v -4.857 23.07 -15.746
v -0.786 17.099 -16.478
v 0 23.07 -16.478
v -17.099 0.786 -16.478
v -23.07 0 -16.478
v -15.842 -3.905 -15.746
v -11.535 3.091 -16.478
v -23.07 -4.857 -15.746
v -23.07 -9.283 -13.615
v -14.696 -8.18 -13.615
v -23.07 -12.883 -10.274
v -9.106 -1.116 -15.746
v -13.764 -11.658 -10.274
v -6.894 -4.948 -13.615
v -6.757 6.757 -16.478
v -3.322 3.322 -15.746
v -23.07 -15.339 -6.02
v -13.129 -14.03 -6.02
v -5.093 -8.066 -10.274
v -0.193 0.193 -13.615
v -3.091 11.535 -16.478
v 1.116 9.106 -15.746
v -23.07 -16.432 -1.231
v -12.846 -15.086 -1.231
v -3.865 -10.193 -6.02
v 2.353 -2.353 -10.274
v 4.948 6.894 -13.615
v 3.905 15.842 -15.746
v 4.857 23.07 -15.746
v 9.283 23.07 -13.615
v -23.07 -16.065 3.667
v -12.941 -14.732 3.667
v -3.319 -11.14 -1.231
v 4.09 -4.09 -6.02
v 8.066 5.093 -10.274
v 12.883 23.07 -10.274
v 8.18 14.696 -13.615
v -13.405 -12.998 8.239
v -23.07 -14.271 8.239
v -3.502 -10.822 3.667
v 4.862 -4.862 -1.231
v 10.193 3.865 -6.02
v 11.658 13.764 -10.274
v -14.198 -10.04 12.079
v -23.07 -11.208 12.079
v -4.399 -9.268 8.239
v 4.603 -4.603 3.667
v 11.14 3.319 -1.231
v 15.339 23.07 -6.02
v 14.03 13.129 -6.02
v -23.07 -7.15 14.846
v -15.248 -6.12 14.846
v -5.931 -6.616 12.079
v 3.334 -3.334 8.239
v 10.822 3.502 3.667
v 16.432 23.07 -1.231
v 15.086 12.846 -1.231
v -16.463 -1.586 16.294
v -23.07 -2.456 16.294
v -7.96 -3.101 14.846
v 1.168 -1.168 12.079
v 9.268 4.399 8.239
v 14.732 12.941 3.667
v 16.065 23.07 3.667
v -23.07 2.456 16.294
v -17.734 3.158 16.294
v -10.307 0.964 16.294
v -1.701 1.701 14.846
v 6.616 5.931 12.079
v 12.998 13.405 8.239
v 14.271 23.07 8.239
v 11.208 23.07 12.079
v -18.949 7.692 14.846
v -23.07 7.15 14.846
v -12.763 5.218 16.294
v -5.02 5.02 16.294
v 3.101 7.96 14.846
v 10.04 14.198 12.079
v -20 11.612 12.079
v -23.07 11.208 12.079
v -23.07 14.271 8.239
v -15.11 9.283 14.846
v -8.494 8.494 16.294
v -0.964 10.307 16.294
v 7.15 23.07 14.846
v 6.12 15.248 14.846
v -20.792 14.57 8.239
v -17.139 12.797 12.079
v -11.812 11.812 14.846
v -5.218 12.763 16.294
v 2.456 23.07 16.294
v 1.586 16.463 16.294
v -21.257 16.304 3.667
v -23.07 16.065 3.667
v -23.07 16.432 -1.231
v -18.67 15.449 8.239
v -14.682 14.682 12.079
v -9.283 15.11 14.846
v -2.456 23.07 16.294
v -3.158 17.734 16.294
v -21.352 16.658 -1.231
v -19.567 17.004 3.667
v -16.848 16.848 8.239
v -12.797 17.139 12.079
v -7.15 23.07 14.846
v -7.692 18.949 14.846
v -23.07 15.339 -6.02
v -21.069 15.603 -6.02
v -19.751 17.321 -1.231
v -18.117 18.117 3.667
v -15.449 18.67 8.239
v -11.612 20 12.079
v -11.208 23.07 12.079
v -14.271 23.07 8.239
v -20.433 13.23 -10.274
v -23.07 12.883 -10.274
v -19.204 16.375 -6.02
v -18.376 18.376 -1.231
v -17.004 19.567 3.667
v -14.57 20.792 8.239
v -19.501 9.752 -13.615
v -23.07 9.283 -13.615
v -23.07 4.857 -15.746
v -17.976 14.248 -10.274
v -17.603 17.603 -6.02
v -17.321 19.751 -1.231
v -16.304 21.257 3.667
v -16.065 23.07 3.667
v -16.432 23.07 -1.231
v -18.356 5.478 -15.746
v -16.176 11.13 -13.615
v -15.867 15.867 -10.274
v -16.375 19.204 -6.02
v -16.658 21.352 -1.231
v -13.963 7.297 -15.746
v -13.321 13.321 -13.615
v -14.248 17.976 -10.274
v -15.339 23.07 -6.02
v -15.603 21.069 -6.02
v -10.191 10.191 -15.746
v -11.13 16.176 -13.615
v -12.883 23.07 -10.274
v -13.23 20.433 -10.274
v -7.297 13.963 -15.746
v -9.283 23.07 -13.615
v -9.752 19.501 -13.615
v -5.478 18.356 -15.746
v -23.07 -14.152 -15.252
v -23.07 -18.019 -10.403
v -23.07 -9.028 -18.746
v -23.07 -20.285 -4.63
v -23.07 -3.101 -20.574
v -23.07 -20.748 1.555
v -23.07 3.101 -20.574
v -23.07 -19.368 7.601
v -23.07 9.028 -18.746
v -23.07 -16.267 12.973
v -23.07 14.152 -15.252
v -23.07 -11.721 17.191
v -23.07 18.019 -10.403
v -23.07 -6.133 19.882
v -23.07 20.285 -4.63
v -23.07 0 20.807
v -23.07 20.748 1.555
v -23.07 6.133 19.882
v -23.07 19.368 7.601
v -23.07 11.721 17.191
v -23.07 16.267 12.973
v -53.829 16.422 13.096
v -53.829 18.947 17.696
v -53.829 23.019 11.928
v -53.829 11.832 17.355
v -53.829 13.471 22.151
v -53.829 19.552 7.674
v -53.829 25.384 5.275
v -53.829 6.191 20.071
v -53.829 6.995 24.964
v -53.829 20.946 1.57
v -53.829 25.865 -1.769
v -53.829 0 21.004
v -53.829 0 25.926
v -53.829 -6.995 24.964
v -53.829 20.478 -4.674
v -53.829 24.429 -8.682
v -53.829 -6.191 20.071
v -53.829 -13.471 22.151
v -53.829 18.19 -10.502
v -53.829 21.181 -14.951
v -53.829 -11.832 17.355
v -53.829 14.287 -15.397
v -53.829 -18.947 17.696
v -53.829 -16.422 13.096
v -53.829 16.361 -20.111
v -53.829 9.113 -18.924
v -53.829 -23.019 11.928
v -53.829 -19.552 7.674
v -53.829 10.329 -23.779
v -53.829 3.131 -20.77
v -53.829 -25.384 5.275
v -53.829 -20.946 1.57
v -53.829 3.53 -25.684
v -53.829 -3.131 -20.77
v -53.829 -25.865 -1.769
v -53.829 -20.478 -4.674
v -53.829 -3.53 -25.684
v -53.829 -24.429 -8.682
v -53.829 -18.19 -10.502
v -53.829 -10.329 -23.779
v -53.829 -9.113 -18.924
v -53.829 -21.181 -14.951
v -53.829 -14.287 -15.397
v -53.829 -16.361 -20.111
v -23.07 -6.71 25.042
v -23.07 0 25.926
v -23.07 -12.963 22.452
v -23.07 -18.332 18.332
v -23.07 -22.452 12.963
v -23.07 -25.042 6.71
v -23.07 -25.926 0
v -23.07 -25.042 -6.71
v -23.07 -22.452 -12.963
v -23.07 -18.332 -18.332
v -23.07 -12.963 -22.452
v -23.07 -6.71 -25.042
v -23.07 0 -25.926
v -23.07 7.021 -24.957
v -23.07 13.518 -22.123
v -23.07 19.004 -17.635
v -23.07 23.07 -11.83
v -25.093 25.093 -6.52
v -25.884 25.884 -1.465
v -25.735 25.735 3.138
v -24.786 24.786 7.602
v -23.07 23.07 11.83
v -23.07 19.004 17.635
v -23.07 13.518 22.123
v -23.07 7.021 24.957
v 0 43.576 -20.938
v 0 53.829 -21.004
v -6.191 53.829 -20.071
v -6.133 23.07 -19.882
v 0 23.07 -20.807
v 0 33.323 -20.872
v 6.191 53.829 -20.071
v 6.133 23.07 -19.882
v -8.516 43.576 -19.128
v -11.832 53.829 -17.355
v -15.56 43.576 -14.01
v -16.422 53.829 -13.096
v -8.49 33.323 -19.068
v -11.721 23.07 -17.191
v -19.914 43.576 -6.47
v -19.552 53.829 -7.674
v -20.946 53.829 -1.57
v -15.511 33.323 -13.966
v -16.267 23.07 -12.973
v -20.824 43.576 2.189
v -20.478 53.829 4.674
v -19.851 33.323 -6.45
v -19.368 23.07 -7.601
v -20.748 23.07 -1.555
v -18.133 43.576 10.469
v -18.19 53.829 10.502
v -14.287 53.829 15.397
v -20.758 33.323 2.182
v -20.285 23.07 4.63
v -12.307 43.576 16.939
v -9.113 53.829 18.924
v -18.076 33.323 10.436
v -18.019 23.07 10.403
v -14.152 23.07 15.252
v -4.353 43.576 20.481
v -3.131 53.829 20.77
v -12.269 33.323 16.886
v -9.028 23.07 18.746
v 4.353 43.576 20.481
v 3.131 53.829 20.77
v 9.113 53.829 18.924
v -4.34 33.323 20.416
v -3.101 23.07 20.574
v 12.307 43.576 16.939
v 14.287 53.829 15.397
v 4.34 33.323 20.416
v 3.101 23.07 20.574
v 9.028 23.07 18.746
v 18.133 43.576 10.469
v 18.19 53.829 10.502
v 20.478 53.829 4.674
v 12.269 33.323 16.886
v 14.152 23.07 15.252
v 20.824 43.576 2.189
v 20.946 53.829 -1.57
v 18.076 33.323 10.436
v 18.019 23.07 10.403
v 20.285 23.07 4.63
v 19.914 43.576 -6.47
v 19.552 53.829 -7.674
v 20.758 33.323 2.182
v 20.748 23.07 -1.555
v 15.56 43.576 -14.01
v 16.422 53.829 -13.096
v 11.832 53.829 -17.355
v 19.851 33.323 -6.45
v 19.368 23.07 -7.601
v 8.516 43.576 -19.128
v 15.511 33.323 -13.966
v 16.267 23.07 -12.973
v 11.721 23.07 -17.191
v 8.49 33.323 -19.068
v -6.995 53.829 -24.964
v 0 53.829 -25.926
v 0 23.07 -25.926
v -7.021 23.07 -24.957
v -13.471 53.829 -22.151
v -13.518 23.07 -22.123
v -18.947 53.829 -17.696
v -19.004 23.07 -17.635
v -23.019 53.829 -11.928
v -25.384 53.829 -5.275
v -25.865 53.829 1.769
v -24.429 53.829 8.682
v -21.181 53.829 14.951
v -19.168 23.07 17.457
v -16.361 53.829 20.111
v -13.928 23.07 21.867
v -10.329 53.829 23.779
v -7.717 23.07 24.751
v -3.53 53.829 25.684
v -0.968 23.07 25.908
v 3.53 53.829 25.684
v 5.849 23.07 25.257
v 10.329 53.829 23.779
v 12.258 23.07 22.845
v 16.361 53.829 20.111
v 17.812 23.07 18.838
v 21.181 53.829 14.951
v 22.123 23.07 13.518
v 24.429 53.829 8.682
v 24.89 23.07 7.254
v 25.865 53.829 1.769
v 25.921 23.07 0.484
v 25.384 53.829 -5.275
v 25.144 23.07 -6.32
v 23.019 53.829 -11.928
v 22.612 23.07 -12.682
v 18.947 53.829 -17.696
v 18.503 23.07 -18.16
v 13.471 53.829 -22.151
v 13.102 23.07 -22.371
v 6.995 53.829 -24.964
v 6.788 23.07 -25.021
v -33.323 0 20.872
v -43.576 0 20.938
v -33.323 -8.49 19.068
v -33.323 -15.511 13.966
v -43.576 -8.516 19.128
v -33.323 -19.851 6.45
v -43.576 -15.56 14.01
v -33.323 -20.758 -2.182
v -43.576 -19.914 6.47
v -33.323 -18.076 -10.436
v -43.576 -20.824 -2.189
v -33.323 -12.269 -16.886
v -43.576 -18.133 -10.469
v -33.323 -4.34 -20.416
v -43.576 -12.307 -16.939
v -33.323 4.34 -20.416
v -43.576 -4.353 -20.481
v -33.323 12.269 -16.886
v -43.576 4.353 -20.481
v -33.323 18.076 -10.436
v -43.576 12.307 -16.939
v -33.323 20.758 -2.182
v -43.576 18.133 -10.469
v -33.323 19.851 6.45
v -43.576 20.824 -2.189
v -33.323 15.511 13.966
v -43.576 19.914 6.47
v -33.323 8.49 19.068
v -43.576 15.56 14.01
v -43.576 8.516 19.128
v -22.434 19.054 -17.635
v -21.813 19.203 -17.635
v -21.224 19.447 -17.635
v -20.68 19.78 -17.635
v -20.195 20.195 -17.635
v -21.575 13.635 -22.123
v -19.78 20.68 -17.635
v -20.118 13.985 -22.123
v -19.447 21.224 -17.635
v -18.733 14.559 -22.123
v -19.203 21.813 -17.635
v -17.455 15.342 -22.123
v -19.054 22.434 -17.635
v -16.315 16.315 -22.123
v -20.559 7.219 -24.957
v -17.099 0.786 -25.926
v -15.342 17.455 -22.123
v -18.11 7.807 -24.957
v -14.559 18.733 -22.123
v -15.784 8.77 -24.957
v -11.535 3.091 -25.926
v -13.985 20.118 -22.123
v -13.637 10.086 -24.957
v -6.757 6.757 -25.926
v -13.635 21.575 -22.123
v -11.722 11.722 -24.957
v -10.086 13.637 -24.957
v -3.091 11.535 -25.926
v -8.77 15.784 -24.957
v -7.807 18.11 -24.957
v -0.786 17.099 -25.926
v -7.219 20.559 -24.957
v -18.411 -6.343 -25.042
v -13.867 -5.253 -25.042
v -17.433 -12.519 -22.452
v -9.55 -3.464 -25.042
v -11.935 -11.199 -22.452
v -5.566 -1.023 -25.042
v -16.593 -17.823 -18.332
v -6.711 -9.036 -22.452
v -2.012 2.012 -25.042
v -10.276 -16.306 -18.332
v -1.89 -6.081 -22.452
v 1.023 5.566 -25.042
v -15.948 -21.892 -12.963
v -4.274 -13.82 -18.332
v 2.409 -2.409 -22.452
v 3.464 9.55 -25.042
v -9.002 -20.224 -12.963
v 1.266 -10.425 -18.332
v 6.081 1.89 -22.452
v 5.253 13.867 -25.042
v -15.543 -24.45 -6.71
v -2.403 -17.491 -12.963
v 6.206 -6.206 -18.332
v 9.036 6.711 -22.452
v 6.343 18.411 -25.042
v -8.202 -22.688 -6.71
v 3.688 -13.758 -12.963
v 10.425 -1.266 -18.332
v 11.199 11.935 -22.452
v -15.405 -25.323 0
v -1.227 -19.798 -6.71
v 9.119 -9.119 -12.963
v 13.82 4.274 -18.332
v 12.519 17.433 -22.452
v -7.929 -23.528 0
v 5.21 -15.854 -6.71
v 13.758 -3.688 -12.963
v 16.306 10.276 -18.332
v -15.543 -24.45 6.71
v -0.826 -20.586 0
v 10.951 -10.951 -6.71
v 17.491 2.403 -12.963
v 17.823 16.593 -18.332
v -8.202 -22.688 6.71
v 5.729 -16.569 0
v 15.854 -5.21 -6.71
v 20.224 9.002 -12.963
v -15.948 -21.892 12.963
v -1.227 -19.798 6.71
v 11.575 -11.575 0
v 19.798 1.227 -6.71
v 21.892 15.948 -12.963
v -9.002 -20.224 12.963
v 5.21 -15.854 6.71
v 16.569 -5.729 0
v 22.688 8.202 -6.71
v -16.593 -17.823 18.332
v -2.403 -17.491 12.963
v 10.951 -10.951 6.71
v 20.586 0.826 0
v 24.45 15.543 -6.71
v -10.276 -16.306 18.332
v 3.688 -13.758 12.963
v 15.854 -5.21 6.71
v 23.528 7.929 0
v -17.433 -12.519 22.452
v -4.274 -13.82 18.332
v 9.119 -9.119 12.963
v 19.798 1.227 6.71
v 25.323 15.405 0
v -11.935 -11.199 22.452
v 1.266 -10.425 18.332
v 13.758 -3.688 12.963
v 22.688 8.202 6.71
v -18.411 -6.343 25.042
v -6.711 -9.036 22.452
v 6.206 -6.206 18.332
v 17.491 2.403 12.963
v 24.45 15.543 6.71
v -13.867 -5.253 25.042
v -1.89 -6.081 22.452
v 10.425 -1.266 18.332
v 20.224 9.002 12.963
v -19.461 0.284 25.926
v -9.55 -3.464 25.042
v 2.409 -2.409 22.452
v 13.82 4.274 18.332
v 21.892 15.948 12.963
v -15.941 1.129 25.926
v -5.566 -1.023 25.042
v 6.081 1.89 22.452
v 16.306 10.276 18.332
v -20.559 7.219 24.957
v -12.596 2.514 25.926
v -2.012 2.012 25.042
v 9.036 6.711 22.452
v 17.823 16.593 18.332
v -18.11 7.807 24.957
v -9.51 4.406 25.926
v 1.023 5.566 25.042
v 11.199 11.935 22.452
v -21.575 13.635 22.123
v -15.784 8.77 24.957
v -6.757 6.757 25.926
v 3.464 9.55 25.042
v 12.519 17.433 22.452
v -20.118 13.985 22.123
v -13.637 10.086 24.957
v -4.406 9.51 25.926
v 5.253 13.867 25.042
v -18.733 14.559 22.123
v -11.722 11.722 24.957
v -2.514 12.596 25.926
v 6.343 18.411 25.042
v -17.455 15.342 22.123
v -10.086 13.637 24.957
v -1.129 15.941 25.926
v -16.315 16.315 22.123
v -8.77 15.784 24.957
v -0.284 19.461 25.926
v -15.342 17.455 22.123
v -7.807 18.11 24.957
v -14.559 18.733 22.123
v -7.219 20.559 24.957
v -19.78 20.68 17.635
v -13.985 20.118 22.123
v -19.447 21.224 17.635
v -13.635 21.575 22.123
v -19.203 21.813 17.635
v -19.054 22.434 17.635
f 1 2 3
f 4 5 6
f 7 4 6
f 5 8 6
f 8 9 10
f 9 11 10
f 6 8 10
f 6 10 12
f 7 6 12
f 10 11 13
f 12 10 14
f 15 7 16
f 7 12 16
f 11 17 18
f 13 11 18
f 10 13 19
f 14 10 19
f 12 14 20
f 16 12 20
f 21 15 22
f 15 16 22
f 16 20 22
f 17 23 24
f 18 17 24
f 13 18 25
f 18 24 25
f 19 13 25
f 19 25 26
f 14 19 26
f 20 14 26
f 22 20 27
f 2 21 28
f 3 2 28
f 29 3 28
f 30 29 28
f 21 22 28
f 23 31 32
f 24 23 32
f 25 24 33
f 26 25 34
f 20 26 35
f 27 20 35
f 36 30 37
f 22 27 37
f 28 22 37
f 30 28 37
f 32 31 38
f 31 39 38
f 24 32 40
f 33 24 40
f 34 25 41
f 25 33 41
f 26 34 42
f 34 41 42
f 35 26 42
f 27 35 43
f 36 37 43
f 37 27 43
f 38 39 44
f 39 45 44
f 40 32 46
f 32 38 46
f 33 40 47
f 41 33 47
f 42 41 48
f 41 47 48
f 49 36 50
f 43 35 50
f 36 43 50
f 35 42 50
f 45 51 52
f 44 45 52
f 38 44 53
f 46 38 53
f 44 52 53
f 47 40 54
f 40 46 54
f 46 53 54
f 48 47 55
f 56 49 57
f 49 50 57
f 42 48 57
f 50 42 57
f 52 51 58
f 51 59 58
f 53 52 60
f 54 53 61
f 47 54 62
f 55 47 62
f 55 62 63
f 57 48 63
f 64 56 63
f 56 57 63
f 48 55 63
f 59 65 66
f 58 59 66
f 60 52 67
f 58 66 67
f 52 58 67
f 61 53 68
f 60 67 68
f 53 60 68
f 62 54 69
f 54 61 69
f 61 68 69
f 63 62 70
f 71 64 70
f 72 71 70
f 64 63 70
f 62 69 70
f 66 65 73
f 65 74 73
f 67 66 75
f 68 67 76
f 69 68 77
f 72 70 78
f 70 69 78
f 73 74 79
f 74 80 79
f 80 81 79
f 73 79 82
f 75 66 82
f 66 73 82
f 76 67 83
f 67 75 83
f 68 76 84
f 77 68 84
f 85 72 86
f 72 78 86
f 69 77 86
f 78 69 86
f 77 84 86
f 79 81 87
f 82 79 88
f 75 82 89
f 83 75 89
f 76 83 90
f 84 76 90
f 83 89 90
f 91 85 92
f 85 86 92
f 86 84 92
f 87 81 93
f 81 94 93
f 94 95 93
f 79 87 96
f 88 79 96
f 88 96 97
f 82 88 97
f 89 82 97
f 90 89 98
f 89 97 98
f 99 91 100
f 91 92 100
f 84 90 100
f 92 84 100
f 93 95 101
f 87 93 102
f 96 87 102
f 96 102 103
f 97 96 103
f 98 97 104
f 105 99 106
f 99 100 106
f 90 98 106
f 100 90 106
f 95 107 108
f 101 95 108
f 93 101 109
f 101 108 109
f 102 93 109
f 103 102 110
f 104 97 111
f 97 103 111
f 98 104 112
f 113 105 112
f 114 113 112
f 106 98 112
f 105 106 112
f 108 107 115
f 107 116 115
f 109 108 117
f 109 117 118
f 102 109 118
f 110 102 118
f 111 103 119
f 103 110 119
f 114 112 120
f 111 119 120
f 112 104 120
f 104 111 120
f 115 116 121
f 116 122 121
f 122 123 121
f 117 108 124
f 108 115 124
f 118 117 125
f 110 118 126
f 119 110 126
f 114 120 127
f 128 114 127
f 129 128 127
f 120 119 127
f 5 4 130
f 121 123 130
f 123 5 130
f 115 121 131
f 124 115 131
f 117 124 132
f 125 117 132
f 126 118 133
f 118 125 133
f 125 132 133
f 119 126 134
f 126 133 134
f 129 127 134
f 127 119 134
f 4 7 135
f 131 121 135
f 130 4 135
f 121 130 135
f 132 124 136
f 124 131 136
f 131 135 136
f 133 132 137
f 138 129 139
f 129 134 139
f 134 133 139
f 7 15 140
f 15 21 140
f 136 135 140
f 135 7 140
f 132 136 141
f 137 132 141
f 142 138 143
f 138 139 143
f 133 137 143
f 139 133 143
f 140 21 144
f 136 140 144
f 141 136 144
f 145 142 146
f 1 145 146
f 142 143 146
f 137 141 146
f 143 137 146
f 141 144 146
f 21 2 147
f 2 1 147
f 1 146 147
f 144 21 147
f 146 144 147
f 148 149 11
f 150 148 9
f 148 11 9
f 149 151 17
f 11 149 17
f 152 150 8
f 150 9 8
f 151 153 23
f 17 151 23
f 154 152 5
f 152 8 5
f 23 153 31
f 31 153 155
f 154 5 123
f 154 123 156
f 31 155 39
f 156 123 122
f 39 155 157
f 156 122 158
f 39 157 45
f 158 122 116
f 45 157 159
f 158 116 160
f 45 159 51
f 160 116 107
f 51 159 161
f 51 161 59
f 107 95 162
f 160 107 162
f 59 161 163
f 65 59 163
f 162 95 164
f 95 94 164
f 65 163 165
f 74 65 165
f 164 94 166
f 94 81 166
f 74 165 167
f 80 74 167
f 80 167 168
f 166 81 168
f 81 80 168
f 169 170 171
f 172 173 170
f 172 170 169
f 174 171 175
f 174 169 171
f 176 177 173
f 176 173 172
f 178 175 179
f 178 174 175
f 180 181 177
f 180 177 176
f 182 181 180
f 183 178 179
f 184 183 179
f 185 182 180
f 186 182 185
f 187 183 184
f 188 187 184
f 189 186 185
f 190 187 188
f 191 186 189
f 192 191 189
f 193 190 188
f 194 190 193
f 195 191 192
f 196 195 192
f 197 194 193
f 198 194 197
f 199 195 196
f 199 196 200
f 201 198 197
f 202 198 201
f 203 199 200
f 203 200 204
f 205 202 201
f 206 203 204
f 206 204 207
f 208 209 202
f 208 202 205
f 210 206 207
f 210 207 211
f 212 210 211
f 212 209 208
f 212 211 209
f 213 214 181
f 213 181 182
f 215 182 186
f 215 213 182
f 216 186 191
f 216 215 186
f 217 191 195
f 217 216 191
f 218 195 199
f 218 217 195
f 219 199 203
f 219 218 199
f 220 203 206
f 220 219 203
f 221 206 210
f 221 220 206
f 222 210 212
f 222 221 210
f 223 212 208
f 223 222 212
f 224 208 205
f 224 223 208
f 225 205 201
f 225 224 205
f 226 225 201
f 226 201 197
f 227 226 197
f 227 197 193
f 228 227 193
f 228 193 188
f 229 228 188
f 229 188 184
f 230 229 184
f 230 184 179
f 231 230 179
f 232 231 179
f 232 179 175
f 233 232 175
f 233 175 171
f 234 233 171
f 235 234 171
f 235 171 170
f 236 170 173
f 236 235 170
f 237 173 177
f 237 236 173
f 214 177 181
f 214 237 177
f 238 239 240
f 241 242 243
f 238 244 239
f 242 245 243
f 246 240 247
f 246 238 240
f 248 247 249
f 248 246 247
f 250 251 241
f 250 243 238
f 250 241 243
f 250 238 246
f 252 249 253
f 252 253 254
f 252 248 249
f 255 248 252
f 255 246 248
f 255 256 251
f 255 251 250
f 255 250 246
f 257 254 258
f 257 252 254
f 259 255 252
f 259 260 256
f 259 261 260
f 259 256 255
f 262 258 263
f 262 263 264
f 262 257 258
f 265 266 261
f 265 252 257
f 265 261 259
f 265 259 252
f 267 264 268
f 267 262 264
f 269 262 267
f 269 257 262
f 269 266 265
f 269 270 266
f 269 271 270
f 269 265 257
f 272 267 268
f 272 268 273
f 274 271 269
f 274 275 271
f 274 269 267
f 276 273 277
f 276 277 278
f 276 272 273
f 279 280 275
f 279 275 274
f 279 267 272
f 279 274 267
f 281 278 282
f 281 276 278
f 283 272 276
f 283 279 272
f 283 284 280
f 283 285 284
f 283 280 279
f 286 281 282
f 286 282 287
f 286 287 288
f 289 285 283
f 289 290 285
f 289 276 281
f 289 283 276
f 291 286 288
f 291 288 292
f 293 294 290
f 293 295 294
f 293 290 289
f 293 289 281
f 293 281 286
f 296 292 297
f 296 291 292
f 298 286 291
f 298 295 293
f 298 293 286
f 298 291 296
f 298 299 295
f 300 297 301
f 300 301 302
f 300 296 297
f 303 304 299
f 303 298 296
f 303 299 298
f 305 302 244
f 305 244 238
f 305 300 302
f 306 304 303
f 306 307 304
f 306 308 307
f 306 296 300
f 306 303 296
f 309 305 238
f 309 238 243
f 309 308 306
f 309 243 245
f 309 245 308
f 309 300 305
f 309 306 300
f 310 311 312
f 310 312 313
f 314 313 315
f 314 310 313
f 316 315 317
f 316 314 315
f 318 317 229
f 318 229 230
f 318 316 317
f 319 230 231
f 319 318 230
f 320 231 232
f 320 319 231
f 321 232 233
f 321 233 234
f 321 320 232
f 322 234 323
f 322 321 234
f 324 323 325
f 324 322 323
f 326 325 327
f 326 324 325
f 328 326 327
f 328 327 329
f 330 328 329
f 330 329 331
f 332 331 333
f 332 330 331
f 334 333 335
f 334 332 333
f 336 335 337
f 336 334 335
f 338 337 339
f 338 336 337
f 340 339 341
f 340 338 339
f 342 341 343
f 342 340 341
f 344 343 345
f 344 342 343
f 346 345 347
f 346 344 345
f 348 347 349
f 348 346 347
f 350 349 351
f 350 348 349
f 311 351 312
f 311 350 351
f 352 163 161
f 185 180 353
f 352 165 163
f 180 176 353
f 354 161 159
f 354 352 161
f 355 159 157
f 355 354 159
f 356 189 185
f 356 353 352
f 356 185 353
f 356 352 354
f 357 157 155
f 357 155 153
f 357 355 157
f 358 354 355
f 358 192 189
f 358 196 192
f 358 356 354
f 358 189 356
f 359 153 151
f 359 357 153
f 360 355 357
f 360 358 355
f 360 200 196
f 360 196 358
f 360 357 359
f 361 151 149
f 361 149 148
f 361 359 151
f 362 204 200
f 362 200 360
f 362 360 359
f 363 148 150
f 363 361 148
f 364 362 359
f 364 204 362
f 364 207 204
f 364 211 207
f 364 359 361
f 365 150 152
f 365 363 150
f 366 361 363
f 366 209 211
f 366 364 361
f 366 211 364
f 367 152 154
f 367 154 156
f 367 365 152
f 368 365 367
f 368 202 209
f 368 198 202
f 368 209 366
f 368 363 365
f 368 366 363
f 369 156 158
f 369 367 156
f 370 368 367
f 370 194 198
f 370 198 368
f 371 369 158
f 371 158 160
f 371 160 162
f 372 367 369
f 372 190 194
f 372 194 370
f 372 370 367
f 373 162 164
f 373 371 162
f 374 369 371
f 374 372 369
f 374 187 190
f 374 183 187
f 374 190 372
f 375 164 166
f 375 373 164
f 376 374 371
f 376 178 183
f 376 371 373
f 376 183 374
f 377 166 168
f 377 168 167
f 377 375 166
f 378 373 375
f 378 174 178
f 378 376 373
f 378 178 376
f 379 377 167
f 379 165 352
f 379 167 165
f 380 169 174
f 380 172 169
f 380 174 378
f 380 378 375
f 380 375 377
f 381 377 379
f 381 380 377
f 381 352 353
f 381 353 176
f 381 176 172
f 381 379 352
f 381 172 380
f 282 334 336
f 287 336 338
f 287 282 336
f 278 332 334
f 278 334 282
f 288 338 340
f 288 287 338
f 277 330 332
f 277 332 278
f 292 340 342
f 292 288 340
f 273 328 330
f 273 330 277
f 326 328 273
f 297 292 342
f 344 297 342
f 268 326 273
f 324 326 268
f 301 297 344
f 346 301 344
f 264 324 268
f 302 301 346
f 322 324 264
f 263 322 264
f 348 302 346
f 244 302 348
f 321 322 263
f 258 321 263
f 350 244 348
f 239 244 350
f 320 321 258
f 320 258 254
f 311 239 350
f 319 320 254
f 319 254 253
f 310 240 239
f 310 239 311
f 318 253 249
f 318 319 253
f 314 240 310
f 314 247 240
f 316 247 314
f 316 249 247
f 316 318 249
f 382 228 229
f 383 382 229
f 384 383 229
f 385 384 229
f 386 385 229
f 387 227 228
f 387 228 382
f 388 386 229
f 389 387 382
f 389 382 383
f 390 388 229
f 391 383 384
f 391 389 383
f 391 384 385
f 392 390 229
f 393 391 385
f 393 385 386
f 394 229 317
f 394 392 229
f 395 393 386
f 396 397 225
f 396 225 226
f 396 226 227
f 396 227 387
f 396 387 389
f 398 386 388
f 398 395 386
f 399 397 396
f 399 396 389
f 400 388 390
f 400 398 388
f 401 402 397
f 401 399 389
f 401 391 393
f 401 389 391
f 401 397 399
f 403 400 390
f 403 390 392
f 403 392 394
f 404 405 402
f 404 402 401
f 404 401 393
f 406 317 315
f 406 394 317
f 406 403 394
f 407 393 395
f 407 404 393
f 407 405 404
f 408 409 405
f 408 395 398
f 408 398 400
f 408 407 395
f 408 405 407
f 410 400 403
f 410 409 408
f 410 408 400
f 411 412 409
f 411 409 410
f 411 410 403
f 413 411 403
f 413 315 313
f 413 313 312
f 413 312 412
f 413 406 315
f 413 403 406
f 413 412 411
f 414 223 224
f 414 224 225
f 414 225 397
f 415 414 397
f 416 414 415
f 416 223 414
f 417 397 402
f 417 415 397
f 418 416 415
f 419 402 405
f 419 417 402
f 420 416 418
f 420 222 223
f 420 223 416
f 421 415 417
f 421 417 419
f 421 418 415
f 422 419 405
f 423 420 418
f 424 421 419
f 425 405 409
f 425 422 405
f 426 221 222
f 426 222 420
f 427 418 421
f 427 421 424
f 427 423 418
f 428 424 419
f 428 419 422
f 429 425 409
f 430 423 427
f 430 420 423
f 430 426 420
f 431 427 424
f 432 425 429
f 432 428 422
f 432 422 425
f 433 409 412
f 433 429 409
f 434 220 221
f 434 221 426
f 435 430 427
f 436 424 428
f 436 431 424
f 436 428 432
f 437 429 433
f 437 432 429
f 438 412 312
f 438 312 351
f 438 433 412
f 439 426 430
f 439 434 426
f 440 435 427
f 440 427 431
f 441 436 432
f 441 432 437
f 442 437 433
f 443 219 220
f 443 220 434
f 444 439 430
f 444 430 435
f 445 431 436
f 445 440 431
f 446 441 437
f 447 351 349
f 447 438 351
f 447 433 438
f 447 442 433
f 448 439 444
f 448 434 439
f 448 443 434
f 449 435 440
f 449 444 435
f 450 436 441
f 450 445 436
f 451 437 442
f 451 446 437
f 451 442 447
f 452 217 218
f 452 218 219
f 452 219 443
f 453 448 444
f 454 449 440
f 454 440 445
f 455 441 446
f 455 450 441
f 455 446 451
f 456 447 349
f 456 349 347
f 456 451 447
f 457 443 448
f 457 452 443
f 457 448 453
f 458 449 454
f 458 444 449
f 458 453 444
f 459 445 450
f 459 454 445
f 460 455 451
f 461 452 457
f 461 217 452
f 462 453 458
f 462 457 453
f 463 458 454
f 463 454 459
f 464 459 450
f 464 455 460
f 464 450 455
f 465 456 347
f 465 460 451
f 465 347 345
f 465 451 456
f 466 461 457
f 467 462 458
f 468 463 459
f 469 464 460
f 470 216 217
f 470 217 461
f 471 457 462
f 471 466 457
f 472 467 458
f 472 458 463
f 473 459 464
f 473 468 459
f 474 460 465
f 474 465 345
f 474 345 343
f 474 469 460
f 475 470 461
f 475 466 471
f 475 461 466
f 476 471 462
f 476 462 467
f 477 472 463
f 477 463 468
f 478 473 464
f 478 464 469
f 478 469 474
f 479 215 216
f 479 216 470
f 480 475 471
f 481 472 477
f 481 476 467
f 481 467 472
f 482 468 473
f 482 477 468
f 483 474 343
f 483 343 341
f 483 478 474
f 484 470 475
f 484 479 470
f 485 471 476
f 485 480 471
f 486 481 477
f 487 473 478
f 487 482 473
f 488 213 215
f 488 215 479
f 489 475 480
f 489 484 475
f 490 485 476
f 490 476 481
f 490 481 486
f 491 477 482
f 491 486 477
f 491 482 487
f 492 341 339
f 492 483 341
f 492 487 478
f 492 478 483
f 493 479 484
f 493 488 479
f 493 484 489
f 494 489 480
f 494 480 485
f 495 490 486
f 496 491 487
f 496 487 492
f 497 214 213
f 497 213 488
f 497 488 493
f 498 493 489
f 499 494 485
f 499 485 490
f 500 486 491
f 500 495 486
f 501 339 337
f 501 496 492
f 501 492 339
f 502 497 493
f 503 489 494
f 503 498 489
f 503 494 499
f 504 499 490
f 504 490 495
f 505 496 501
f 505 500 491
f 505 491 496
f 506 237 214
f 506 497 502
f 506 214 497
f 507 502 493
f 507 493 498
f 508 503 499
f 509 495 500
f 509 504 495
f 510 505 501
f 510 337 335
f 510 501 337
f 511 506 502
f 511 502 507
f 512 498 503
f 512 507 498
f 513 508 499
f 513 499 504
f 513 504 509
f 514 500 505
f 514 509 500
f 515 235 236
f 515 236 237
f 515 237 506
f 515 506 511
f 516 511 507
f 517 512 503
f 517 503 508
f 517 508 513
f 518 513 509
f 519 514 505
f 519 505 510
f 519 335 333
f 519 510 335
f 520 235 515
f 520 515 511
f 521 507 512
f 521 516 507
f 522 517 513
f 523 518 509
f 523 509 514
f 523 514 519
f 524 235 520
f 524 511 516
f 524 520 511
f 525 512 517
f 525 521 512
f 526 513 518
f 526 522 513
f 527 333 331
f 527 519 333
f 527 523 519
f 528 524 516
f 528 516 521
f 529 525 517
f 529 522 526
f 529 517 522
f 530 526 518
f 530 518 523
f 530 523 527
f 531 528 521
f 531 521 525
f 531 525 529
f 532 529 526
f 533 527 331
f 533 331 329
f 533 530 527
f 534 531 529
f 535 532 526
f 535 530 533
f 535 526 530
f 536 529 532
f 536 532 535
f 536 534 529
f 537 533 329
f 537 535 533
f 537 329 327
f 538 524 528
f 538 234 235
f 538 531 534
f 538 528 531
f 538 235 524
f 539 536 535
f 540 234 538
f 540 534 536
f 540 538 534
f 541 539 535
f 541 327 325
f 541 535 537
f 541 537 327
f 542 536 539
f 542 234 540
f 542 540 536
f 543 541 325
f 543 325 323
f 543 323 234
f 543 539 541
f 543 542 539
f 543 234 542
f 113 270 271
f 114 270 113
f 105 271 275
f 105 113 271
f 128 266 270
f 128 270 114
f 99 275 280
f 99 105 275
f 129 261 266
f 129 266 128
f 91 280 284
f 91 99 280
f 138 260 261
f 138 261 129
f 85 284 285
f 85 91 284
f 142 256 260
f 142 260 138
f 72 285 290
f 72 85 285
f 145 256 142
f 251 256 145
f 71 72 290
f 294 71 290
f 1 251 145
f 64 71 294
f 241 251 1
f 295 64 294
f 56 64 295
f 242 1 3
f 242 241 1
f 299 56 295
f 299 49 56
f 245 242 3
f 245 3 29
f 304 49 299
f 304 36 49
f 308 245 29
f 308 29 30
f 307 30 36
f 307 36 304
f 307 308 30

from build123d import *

# Parameters (mm, degrees)
SKETCH3_R    = 29.972
SKETCH3_R_2  = 19.05
SCALE1_SCALE = 0.865


with BuildPart() as part:
    # Sketch1 → Revolve1 (revolve)
    with BuildSketch(Plane.XY):
        Polygon((-62.23, -29.972), (-26.67, -29.972), (-26.67, -24.0538), (-62.23, -24.2824), align=None)
    revolve(axis=Axis((-62.23, 0, 0), (1, 0, 0)))


with BuildPart() as body_2:
    # Sketch2 → Revolve2 (revolve)
    with BuildSketch(Plane.XY):
        Polygon((24.2824, 62.23), (24.0538, 26.67), (29.972, 26.67), (29.972, 62.23), align=None)
    revolve(axis=Axis((0, 0, 0), (0, 1, 0)))


with BuildPart() as sweep1_tool:
    # Sweep1: sweep along a path in Sketch4
    with BuildLine(Plane.XY) as sweep1_path:
        ThreePointArc((-26.67, 0), (-7.811462, 7.811462), (0, 26.67))
    # Sketch3 → Sweep1 (sweep)
    with BuildSketch(Plane(origin=(-26.67, 0, 0), x_dir=(0, 0, -1), z_dir=(1, 0, 0))):
        Circle(SKETCH3_R)
        Circle(SKETCH3_R_2, mode=Mode.SUBTRACT)
    sweep(path=sweep1_path.line)


with BuildPart() as part_1:
    add(part.part)


with BuildPart() as part_2:
    # Sweep1: joined with sweep1_tool
    add(part_1.part.fuse(sweep1_tool.part, body_2.part, tol=0.00001))


with BuildPart() as part_3:
    # Scale1: scaled about (0, 0, 0)
    add(part_2.part.scale(SCALE1_SCALE))


solid = part_3.part
